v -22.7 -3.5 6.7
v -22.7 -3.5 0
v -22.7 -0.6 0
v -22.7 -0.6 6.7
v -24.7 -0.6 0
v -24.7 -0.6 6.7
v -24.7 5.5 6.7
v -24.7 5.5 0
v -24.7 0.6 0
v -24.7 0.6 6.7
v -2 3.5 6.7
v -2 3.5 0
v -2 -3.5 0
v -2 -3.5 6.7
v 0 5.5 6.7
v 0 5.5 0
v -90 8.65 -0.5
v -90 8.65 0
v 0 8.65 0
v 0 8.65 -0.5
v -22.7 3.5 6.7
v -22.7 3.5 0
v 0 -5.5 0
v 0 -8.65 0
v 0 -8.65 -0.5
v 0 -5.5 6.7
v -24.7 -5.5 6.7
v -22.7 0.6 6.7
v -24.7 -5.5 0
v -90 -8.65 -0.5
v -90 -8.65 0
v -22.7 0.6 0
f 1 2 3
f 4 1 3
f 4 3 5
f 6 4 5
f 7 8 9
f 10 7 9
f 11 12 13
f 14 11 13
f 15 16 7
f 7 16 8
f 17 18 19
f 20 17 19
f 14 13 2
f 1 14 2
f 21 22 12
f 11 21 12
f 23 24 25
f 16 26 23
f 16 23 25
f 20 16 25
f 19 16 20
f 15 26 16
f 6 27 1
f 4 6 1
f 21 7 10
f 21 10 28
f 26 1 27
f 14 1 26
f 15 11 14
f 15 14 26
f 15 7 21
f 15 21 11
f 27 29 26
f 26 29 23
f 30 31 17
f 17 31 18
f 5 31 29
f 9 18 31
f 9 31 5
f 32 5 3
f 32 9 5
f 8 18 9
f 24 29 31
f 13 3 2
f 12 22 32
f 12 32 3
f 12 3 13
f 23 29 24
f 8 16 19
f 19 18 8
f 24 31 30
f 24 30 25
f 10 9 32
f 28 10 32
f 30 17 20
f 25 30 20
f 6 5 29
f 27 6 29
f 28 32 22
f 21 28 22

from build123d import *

# Parameters (mm, degrees)
PAD_DEPTH    = 6.7
SKETCH001_W  = 90
SKETCH001_H  = 17.3
PAD001_DEPTH = 0.5


with BuildPart() as part:
    # Sketch (on Sketch) → Pad (new body)
    with BuildSketch(Plane.XY):
        Polygon((-22.7, 3.5), (-2, 3.5), (-2, -3.5), (-22.7, -3.5), (-22.7, -0.6), (-24.7, -0.6), (-24.7, -5.5), (0, -5.5), (0, 5.5), (-24.7, 5.5), (-24.7, 0.6), (-22.7, 0.6), align=None)
    extrude(amount=PAD_DEPTH)

    # Sketch001 → Pad001 (join)
    with BuildSketch(Plane.XY):
        with Locations((-45, 0)):
            Rectangle(SKETCH001_W, SKETCH001_H)
    extrude(amount=-PAD001_DEPTH)


solid = part.part
